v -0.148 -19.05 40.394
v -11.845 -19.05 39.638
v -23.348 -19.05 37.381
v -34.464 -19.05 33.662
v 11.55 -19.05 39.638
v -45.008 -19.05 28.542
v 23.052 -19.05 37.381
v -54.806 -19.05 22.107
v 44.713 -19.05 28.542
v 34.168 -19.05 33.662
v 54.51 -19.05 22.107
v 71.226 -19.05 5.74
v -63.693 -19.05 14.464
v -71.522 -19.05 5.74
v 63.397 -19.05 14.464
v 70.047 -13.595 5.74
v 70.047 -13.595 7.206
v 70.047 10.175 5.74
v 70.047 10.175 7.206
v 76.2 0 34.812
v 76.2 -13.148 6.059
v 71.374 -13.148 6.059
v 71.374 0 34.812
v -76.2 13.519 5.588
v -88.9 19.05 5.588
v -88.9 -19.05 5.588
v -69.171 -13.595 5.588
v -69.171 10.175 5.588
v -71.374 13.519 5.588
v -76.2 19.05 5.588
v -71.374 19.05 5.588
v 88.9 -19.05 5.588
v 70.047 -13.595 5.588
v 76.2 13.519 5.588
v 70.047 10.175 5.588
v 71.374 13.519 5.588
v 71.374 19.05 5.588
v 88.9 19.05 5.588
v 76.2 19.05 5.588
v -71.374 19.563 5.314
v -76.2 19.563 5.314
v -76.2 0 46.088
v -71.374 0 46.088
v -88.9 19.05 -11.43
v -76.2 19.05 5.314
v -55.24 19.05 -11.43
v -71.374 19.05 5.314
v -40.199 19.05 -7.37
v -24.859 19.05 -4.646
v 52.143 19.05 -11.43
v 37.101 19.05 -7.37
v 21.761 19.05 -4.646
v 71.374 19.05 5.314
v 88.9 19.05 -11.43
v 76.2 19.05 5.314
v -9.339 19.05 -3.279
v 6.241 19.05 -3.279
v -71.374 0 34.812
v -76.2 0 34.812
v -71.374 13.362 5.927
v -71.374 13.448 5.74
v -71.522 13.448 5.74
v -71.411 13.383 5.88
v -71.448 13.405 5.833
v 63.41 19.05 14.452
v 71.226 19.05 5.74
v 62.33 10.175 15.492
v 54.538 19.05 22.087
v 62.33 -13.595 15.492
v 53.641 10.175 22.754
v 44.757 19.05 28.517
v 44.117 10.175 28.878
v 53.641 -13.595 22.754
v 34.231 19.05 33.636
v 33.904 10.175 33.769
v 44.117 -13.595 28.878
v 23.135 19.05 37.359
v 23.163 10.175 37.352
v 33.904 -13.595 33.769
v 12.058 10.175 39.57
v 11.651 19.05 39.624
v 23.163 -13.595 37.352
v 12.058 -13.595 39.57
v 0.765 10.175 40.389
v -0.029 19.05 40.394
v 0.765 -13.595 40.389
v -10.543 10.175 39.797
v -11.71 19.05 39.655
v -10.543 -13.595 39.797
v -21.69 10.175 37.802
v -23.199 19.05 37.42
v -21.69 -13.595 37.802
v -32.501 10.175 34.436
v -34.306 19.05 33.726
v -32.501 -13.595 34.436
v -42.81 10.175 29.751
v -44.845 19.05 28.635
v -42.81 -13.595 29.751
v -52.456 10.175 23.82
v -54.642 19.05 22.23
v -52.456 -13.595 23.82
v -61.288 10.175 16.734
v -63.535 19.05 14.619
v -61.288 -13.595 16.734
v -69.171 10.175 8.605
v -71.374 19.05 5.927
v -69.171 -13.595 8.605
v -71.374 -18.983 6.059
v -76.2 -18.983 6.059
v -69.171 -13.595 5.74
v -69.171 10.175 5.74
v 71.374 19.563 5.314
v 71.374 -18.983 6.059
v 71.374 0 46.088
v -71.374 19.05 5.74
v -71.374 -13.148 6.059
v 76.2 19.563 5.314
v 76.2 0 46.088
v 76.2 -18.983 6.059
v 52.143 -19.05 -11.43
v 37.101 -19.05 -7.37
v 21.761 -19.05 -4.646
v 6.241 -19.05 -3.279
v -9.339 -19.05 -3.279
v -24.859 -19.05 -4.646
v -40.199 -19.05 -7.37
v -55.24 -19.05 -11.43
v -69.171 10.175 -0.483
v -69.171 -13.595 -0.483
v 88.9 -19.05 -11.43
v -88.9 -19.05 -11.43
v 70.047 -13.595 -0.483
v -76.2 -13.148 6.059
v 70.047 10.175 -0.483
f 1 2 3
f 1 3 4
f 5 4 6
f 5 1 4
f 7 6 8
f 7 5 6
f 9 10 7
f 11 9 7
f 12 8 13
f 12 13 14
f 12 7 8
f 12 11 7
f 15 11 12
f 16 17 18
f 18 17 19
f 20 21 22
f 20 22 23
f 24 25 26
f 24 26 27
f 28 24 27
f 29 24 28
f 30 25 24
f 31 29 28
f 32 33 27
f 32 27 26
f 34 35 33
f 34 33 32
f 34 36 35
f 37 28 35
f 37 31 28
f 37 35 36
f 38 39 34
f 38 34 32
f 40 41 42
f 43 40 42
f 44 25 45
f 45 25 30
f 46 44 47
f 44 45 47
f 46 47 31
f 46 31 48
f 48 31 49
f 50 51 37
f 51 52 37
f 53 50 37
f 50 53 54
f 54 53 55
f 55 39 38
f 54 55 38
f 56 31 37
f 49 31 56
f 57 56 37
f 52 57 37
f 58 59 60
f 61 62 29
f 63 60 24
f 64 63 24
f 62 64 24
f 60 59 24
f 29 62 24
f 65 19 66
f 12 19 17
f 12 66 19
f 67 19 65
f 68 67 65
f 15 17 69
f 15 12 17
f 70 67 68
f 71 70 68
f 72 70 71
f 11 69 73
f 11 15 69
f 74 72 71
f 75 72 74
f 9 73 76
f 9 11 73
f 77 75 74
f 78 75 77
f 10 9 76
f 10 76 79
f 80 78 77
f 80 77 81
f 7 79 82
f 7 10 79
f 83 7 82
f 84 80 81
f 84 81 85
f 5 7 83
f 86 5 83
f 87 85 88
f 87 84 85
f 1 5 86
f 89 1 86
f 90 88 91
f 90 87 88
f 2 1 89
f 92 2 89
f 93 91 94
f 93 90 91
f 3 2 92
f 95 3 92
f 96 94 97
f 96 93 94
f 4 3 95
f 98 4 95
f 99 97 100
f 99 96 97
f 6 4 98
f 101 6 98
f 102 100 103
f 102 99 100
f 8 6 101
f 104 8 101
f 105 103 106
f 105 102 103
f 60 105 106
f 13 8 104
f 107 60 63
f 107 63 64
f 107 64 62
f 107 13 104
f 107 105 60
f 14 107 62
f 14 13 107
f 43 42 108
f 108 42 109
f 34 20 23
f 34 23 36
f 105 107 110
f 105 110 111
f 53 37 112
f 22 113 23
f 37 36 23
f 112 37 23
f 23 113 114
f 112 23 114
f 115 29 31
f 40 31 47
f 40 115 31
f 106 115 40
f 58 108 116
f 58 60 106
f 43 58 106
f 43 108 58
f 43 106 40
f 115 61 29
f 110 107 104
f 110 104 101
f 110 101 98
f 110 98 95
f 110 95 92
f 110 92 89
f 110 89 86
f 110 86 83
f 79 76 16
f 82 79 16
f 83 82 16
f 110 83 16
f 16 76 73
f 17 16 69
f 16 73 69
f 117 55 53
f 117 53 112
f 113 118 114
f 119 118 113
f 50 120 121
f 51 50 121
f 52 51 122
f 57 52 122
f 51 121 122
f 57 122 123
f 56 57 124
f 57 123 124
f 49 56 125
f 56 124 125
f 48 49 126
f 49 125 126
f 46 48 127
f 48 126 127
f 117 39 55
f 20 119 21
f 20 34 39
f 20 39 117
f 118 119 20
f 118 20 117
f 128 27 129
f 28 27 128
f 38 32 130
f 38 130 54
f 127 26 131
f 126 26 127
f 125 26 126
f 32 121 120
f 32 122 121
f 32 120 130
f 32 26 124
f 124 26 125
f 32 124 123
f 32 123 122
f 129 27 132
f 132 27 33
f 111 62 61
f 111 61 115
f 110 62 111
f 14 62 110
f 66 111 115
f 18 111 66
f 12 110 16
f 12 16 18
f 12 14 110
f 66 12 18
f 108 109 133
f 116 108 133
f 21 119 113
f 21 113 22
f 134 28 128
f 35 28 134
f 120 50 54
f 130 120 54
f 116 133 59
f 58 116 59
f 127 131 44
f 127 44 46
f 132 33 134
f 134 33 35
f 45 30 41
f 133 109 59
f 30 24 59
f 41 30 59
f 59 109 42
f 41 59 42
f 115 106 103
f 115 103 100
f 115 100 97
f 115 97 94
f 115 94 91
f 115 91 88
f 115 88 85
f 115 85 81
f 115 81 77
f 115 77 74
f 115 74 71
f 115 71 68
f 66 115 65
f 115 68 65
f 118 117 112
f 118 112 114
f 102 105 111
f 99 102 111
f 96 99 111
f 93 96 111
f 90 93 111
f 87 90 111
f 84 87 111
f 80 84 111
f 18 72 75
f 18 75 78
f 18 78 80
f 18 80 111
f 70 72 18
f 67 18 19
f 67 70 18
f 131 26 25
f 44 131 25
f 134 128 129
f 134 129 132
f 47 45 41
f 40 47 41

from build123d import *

# Parameters (mm, degrees)
F0_W      = 177.8
F0_H      = 38.1
F1_DEPTH  = 5.588
F4_DEPTH  = 4.826
F6_DEPTH  = 11.43
F8_DEPTH  = 233.426
F11_DEPTH = 38.1
F13_W     = 139.2178796232
F13_H     = 23.7698024139
F14_DEPTH = 51.308


with BuildPart() as f1:
    # F0 (on Top) → F1 (new body)
    with BuildSketch(Plane.XY):
        Rectangle(F0_W, F0_H)
    extrude(amount=F1_DEPTH)

    # F3 (on offset) → F4 (join)
    with BuildSketch(Plane.YZ.offset(76.2)):
        Polygon((0, 46.0882298648), (-18.9831927419, 6.0590645298), (-13.1481755525, 6.0590645298), (0, 34.8115004599), (13.6455185711, 5.3136325441), (19.5630453527, 5.3136325441), align=None)
    extrude(amount=-F4_DEPTH)

    # F5: F1 across plane


with BuildPart() as f1_1:
    add(f1.part)
    add(f1.part.mirror(Plane.YZ))

    # F6 (add): a face of the model
    f6_faces = [f1_1.faces().sort_by_distance(p)[0] for p in [
        (0, 0, 0),
    ]]
    extrude(f6_faces, amount=F6_DEPTH)

    # F7 (on face) → F8 (cut)
    with BuildSketch(Plane.XZ.offset(19.05)):
        with BuildLine():
            Line((-55.2403405309, -11.43), (52.1429181099, -11.43))
            ThreePointArc((52.1429181099, -11.43), (-1.5487112105, -3.1079738738), (-55.2403405309, -11.43))
        make_face()
    extrude(amount=-F8_DEPTH, mode=Mode.SUBTRACT)

    # F10 (on offset) → F11 (join)
    with BuildSketch(Plane.XZ.offset(19.05)):
        with BuildLine():
            Line((-71.5217785408, 5.7395980693), (71.2262214592, 5.7395980693))
            ThreePointArc((71.2262214592, 5.7395980693), (-0.1477785408, 40.3939508929), (-71.5217785408, 5.7395980693))
        make_face()
    extrude(amount=-F11_DEPTH)

    # F13 (on offset) → F14 (cut)
    with BuildSketch(Plane.XY.offset(50.8254)):
        with Locations((0.4383567721, -1.7096721567)):
            Rectangle(F13_W, F13_H)
    extrude(amount=-F14_DEPTH, mode=Mode.SUBTRACT)


solid = f1_1.part
